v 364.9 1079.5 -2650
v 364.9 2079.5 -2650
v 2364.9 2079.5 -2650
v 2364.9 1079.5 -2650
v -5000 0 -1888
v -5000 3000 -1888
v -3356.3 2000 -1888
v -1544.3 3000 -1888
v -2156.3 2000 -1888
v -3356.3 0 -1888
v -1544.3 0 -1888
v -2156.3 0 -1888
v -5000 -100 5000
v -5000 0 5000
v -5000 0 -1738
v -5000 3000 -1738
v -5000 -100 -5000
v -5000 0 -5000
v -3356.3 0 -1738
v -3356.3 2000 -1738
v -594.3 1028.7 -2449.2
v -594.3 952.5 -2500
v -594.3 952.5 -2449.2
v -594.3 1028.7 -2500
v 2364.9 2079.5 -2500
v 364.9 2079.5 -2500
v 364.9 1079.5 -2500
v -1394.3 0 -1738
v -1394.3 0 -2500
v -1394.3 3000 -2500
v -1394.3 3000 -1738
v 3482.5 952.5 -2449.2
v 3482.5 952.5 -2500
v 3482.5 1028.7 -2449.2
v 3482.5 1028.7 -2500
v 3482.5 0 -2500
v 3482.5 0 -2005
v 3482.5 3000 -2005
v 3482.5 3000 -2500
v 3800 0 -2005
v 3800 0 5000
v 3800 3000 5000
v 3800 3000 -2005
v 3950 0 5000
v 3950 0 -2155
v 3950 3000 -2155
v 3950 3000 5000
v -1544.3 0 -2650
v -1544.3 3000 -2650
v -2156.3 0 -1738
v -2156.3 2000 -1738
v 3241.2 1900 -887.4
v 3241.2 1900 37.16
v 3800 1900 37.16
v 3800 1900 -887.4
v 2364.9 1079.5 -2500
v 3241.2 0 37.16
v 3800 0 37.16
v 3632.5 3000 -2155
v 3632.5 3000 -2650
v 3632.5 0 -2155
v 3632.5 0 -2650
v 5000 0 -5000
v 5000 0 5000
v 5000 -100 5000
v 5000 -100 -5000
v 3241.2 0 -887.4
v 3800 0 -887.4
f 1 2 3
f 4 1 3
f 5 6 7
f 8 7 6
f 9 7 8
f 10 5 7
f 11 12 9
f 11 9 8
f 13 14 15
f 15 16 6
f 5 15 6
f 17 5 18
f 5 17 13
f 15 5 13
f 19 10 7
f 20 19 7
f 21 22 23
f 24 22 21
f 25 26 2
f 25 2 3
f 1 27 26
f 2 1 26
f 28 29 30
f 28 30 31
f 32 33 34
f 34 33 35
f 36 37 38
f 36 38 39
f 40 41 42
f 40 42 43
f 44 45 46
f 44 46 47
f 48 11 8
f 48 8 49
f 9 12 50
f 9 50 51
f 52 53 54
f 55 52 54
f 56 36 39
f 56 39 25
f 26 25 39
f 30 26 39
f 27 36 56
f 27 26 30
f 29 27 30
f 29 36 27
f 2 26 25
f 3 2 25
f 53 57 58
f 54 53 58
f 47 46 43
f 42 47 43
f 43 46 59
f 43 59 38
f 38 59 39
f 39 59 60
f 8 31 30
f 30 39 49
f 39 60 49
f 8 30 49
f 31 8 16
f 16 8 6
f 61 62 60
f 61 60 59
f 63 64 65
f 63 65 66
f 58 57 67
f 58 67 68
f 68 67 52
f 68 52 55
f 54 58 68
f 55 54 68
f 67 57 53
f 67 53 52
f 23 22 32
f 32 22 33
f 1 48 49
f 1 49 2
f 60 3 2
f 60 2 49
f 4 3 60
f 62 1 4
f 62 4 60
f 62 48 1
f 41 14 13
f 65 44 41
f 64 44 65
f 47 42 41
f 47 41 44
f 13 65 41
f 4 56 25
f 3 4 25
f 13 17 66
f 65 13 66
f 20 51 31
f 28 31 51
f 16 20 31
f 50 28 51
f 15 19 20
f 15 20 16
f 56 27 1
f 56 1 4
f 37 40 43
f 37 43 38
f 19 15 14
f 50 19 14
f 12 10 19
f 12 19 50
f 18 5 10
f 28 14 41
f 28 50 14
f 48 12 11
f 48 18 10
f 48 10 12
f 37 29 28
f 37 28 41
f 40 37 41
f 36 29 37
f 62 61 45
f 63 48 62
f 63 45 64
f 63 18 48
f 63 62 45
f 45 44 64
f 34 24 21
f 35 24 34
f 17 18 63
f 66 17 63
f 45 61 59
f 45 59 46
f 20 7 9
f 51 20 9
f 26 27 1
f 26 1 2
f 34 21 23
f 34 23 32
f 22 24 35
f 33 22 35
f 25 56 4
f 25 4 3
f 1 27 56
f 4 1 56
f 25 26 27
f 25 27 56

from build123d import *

# Parameters (mm, degrees)
SKETCH1_W               = 10000
SKETCH1_H               = 10000
BOSS_EXTRUDE1_DEPTH     = 100
BOSS_EXTRUDE2_DEPTH     = 3000
SKETCH4_W               = 2000
SKETCH4_H               = 1000
SKETCH4_W_2             = 1200
SKETCH4_H_2             = 2000
CUT_EXTRUDE1_DEPTH      = 7501
CUT_EXTRUDE1_DEPTH_BACK = 2501
SKETCH4_2_W             = 2000
SKETCH4_2_H             = 1000
BOSS_EXTRUDE3_DEPTH     = 150
SKETCH5_W               = 558.8
SKETCH5_H               = 924.56
BOSS_EXTRUDE4_DEPTH     = 1900
SKETCH6_W               = 4076.8
SKETCH6_H               = 76.2
BOSS_EXTRUDE5_DEPTH     = 50.8


with BuildPart() as part:
    # Sketch1 → Boss-Extrude1 (new body)
    with BuildSketch(Plane(origin=(0, 0, 0), x_dir=(1, 0, 0), z_dir=(0, 1, 0))):
        Rectangle(SKETCH1_W, SKETCH1_H)
    extrude(amount=-BOSS_EXTRUDE1_DEPTH)

    # Sketch3 → Boss-Extrude2 (add)
    with BuildSketch(Plane(origin=(0, 0, 0), x_dir=(1, 0, 0), z_dir=(0, 1, 0))):
        Polygon((3482.5, 2500), (-1394.3, 2500), (-1394.3, 1738), (-5000, 1738), (-5000, 1888), (-1544.3, 1888), (-1544.3, 2650), (3632.5, 2650), (3632.5, 2155), (3950, 2155), (3950, -5000), (3800, -5000), (3800, 2005), (3482.5, 2005), align=None)
    extrude(amount=BOSS_EXTRUDE2_DEPTH)

    # Sketch4 → Cut-Extrude1 (cut, two sides)
    with BuildSketch(Plane.XY.offset(-2500)) as cut_extrude1_sk:
        with Locations((1364.9, 1579.5)):
            Rectangle(SKETCH4_W, SKETCH4_H)
        with Locations((-2756.3, 1000)):
            Rectangle(SKETCH4_W_2, SKETCH4_H_2)
    extrude(amount=CUT_EXTRUDE1_DEPTH, mode=Mode.SUBTRACT)
    extrude(cut_extrude1_sk.sketch, amount=-CUT_EXTRUDE1_DEPTH_BACK, mode=Mode.SUBTRACT)


with BuildPart() as body_2:
    # Sketch4<2> → Boss-Extrude3 (new body)
    with BuildSketch(Plane.XY.offset(-2500)):
        with Locations((1364.9, 1579.5)):
            Rectangle(SKETCH4_2_W, SKETCH4_2_H)
    extrude(amount=-BOSS_EXTRUDE3_DEPTH)


with BuildPart() as body_3:
    # Sketch5 → Boss-Extrude4 (new body)
    with BuildSketch(Plane(origin=(0, 0, 0), x_dir=(1, 0, 0), z_dir=(0, 1, 0))):
        with Locations((3520.6, 425.12)):
            Rectangle(SKETCH5_W, SKETCH5_H)
    extrude(amount=BOSS_EXTRUDE4_DEPTH)


with BuildPart() as body_4:
    # Sketch6 → Boss-Extrude5 (new body)
    with BuildSketch(Plane.XY.offset(-2500)):
        with Locations((1444.1, 990.6)):
            Rectangle(SKETCH6_W, SKETCH6_H)
    extrude(amount=BOSS_EXTRUDE5_DEPTH)


solid = Compound([part.part, body_2.part, body_3.part, body_4.part])
